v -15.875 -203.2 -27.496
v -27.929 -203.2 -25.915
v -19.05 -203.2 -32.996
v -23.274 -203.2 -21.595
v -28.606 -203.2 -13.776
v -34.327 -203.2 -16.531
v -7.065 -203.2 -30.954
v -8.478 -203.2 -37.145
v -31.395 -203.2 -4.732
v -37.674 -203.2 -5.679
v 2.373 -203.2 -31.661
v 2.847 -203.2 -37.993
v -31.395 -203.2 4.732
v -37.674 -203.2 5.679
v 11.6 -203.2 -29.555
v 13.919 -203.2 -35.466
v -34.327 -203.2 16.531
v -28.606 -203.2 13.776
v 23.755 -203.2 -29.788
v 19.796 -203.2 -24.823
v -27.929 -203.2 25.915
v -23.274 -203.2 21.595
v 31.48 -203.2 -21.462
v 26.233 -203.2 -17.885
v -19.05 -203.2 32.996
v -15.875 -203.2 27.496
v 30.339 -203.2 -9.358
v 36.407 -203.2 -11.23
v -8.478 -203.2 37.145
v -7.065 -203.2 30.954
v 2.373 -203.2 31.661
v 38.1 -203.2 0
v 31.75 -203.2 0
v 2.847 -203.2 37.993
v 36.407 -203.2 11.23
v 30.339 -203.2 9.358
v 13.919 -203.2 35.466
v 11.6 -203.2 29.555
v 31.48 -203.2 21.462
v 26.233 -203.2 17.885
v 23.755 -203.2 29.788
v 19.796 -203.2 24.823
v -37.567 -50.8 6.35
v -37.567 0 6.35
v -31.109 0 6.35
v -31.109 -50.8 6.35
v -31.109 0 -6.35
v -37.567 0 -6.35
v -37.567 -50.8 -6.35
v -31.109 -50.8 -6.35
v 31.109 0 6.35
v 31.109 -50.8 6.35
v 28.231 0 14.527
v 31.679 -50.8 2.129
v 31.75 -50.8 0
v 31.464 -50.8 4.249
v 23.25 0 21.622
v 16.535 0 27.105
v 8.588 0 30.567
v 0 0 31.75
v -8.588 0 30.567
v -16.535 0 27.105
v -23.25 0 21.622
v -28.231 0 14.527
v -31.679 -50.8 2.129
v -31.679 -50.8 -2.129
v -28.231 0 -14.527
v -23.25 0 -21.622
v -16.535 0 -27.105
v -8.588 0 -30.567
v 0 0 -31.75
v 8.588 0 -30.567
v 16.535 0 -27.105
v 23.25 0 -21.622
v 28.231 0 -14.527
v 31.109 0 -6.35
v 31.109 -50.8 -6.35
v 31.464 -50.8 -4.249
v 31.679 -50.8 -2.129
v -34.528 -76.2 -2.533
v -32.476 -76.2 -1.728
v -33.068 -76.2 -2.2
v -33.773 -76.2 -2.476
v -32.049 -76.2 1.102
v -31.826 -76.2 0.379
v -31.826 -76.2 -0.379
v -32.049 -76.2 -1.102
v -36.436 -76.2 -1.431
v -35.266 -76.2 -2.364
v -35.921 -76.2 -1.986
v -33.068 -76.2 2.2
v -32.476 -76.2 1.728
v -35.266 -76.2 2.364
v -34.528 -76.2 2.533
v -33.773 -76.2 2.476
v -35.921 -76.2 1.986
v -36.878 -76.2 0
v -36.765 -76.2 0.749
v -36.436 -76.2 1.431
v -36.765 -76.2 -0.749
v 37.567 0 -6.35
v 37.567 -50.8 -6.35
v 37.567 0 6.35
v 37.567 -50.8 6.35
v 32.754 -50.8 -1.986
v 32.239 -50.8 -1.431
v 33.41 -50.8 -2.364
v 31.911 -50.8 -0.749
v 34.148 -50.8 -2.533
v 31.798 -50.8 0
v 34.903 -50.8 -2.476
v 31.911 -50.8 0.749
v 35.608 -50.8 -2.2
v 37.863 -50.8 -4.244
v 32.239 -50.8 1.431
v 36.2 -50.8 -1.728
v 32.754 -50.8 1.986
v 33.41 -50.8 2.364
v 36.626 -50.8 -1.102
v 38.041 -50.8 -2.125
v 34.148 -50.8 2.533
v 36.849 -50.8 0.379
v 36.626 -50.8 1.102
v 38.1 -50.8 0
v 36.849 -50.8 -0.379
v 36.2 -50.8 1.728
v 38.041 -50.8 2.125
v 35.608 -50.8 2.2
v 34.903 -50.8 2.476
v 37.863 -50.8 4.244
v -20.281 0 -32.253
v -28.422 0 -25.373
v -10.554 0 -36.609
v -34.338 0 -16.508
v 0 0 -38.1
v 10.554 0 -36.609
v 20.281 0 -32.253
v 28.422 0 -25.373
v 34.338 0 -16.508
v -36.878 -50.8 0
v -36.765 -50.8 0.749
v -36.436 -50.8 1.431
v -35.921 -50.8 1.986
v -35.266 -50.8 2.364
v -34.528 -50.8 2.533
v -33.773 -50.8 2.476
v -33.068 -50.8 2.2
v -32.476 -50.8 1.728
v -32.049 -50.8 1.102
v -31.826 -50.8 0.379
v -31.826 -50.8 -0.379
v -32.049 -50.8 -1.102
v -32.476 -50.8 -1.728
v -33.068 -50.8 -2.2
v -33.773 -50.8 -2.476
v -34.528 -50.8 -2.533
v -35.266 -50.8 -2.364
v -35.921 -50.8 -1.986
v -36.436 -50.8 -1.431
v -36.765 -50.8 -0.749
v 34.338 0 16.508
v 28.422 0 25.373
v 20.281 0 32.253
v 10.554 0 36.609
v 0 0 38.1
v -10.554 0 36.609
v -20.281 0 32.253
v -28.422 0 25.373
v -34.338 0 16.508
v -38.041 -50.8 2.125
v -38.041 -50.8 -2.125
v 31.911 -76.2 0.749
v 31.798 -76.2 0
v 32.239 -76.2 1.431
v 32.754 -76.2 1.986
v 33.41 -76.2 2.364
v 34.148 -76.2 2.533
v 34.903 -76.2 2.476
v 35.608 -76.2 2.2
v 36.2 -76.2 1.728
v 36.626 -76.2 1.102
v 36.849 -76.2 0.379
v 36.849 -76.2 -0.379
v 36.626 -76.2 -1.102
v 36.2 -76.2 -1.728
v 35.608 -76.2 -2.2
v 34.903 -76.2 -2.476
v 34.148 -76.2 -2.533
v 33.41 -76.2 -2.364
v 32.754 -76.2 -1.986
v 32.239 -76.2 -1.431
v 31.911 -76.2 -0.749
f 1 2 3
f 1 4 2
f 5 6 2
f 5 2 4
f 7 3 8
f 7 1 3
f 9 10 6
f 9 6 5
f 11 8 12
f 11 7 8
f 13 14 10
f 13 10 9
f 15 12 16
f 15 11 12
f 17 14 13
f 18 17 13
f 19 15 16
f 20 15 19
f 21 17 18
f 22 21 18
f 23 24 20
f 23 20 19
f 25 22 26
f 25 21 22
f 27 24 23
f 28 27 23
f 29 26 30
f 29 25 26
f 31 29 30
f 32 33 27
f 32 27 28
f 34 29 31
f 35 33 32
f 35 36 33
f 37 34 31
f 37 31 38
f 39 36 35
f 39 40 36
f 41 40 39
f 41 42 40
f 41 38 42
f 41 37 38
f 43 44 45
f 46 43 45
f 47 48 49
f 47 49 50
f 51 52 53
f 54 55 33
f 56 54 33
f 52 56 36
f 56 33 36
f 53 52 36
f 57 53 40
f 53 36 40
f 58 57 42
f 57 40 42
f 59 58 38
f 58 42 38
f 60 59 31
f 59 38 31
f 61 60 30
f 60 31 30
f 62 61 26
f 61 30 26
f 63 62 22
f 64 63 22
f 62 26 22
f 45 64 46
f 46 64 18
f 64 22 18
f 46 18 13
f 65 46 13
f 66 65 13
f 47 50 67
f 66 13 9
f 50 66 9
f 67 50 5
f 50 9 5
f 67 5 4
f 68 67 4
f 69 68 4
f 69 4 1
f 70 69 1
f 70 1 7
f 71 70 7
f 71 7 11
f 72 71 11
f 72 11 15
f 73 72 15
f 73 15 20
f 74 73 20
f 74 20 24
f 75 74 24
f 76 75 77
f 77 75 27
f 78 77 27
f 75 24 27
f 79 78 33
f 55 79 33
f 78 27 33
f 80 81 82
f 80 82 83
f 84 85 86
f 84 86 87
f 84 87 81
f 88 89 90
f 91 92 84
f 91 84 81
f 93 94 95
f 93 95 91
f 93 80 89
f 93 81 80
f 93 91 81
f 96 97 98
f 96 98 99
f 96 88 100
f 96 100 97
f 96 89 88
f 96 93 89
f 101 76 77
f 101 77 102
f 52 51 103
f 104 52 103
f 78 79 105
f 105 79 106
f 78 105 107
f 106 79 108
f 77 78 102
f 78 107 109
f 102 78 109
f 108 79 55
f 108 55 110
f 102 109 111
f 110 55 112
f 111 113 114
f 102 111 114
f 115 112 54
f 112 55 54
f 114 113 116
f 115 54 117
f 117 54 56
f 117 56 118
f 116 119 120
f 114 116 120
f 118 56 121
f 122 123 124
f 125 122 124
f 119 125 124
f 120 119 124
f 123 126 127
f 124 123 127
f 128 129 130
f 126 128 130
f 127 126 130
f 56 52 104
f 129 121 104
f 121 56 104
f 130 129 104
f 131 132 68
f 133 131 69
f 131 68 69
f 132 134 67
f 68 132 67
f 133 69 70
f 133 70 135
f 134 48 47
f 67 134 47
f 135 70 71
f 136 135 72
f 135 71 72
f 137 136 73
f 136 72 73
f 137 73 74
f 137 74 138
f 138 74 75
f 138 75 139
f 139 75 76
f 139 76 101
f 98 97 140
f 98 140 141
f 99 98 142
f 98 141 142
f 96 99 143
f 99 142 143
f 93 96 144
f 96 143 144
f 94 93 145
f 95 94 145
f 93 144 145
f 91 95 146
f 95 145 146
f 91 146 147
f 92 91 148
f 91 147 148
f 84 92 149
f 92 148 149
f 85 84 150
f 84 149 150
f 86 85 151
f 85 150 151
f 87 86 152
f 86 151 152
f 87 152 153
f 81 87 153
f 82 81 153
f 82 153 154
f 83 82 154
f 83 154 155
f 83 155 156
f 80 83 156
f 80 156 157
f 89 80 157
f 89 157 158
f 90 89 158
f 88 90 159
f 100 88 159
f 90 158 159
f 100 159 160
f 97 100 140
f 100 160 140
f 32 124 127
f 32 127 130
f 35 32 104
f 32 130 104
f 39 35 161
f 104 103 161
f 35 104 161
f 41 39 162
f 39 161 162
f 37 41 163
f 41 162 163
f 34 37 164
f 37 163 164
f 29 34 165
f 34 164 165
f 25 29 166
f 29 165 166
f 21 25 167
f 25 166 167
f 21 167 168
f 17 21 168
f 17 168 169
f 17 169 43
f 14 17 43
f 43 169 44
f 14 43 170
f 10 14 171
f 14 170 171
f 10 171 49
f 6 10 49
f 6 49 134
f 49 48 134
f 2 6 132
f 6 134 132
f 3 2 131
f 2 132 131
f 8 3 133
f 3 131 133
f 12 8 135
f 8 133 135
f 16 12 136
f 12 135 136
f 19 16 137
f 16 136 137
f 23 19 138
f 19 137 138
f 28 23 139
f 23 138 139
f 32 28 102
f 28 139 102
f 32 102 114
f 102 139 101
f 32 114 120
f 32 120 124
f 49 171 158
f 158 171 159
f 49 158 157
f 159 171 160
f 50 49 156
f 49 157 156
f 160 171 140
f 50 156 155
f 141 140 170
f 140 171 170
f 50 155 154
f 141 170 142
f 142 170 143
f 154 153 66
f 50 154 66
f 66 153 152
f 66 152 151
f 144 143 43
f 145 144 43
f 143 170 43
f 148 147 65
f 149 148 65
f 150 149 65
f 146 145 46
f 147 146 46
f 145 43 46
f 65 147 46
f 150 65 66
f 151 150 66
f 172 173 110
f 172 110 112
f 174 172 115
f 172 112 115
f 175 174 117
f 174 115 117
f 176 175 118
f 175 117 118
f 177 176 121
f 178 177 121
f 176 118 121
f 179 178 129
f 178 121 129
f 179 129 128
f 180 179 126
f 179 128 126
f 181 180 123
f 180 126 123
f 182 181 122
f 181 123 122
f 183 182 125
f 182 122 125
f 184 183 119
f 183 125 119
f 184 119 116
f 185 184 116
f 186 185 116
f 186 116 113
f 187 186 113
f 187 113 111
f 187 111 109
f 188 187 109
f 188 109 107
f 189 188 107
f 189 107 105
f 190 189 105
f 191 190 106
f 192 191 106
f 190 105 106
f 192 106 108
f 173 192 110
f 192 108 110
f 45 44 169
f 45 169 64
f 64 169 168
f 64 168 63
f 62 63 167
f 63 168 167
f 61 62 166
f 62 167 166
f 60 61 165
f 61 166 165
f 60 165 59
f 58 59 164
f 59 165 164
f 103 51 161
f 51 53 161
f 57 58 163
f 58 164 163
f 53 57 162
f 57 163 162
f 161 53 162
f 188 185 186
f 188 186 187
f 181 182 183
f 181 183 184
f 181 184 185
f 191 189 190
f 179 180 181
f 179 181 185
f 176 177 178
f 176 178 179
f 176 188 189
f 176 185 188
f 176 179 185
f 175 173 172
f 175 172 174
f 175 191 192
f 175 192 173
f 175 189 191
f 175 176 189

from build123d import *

# Parameters (mm, degrees)
F0_R     = 38.1
F1_DEPTH = 203.2
F2_R     = 31.75
F3_DEPTH = 228.6
F4_W     = 76.2
F4_H     = 12.7
F5_DEPTH = 50.8
F6_R     = 2.54
F7_DEPTH = 25.4


with BuildPart() as f1:
    # F0 (on Front) → F1 (new body)
    with BuildSketch(Plane.XZ):
        Circle(F0_R)
    extrude(amount=F1_DEPTH)

    # F2 (on face) → F3 (cut)
    with BuildSketch(Plane.XZ.offset(203.2)):
        Circle(F2_R)
    extrude(amount=-F3_DEPTH, mode=Mode.SUBTRACT)

    # F4 (on Front) → F5 (cut)
    with BuildSketch(Plane.XZ):
        Rectangle(F4_W, F4_H)
    extrude(amount=F5_DEPTH, mode=Mode.SUBTRACT)

    # F6 (on face) → F7 (cut)
    with BuildSketch(Plane(origin=(0, -50.8, 0), x_dir=(-1, 0, 0), z_dir=(0, 1, 0))):
        with Locations((-34.337813, 0)):
            Circle(F6_R)
        with Locations((34.337813, 0)):
            Circle(F6_R)
    extrude(amount=-F7_DEPTH, mode=Mode.SUBTRACT)


solid = f1.part
